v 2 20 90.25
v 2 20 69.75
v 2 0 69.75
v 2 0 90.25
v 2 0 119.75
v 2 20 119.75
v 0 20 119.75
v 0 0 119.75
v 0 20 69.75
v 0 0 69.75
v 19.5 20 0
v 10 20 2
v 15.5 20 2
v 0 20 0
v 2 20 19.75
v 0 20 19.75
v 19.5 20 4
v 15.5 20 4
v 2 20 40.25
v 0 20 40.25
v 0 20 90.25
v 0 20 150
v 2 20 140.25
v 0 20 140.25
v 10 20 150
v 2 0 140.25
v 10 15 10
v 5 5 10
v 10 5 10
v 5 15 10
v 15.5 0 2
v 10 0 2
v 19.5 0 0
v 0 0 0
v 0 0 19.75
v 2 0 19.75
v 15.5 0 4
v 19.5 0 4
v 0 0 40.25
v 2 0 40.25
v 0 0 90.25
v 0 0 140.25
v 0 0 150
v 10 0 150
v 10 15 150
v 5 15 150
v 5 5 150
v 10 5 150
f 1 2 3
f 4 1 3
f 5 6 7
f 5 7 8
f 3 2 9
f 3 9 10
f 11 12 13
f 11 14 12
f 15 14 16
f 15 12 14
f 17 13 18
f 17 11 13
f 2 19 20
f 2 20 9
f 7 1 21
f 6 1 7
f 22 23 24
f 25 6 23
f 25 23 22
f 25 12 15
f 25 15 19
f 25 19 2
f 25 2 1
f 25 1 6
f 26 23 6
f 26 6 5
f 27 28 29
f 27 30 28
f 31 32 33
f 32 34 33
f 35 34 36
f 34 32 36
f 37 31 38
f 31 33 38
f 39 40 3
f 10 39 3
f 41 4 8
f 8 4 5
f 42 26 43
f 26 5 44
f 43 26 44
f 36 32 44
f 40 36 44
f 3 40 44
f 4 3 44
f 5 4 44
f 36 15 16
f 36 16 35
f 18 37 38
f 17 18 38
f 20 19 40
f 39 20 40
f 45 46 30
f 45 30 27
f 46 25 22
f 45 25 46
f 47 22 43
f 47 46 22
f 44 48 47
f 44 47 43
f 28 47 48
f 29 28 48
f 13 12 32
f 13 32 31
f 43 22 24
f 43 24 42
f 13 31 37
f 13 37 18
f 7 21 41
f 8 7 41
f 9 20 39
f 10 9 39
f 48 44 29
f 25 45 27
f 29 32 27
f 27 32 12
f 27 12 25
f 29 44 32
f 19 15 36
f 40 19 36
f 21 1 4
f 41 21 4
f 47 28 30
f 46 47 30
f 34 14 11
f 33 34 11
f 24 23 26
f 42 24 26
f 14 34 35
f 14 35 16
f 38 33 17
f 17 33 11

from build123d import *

# Parameters (mm, degrees)
F0_W     = 10
F0_H     = 20
F1_DEPTH = 10
F2_W     = 5.5
F2_H     = 20
F3_DEPTH = 2
F4_W     = 4
F4_H     = 20
F5_DEPTH = 4
F6_W     = 5
F6_H     = 5
F7_DEPTH = 140
F8_W     = 20
F8_H     = 9.75
F8_H_2   = 29.5
F9_DEPTH = 2


with BuildPart() as f1:
    # F0 (on Top) → F1 (new body)
    with BuildSketch(Plane.XY):
        with Locations((5, 10)):
            Rectangle(F0_W, F0_H)
    extrude(amount=F1_DEPTH)

    # F2 (on Top) → F3 (join)
    with BuildSketch(Plane.XY):
        with Locations((12.75, 10)):
            Rectangle(F2_W, F2_H)
    extrude(amount=F3_DEPTH)

    # F4 (on Top) → F5 (join)
    with BuildSketch(Plane.XY):
        with Locations((17.5, 10)):
            Rectangle(F4_W, F4_H)
    extrude(amount=F5_DEPTH)

    # F6 (on face) → F7 (join)
    with BuildSketch(Plane.XY.offset(10)):
        Polygon((5, 20), (2, 20), (2, 0), (5, 0), (5, 5), (5, 15), align=None)
        with Locations((7.5, 17.5)):
            Rectangle(F6_W, F6_H)
        with Locations((7.5, 2.5)):
            Rectangle(F6_W, F6_H)
    extrude(amount=F7_DEPTH)

    # F8 (on face) → F9 (join)
    with BuildSketch(Plane(origin=(2, 0, 0), x_dir=(0, -1, 0), z_dir=(-1, 0, 0))):
        with Locations((-10, 145.125)):
            Rectangle(F8_W, F8_H)
        with Locations((-10, 105)):
            Rectangle(F8_W, F8_H_2)
        with Locations((-10, 55)):
            Rectangle(F8_W, F8_H_2)
        with Locations((-10, 14.875)):
            Rectangle(F8_W, F8_H)
    extrude(amount=F9_DEPTH)


solid = f1.part
